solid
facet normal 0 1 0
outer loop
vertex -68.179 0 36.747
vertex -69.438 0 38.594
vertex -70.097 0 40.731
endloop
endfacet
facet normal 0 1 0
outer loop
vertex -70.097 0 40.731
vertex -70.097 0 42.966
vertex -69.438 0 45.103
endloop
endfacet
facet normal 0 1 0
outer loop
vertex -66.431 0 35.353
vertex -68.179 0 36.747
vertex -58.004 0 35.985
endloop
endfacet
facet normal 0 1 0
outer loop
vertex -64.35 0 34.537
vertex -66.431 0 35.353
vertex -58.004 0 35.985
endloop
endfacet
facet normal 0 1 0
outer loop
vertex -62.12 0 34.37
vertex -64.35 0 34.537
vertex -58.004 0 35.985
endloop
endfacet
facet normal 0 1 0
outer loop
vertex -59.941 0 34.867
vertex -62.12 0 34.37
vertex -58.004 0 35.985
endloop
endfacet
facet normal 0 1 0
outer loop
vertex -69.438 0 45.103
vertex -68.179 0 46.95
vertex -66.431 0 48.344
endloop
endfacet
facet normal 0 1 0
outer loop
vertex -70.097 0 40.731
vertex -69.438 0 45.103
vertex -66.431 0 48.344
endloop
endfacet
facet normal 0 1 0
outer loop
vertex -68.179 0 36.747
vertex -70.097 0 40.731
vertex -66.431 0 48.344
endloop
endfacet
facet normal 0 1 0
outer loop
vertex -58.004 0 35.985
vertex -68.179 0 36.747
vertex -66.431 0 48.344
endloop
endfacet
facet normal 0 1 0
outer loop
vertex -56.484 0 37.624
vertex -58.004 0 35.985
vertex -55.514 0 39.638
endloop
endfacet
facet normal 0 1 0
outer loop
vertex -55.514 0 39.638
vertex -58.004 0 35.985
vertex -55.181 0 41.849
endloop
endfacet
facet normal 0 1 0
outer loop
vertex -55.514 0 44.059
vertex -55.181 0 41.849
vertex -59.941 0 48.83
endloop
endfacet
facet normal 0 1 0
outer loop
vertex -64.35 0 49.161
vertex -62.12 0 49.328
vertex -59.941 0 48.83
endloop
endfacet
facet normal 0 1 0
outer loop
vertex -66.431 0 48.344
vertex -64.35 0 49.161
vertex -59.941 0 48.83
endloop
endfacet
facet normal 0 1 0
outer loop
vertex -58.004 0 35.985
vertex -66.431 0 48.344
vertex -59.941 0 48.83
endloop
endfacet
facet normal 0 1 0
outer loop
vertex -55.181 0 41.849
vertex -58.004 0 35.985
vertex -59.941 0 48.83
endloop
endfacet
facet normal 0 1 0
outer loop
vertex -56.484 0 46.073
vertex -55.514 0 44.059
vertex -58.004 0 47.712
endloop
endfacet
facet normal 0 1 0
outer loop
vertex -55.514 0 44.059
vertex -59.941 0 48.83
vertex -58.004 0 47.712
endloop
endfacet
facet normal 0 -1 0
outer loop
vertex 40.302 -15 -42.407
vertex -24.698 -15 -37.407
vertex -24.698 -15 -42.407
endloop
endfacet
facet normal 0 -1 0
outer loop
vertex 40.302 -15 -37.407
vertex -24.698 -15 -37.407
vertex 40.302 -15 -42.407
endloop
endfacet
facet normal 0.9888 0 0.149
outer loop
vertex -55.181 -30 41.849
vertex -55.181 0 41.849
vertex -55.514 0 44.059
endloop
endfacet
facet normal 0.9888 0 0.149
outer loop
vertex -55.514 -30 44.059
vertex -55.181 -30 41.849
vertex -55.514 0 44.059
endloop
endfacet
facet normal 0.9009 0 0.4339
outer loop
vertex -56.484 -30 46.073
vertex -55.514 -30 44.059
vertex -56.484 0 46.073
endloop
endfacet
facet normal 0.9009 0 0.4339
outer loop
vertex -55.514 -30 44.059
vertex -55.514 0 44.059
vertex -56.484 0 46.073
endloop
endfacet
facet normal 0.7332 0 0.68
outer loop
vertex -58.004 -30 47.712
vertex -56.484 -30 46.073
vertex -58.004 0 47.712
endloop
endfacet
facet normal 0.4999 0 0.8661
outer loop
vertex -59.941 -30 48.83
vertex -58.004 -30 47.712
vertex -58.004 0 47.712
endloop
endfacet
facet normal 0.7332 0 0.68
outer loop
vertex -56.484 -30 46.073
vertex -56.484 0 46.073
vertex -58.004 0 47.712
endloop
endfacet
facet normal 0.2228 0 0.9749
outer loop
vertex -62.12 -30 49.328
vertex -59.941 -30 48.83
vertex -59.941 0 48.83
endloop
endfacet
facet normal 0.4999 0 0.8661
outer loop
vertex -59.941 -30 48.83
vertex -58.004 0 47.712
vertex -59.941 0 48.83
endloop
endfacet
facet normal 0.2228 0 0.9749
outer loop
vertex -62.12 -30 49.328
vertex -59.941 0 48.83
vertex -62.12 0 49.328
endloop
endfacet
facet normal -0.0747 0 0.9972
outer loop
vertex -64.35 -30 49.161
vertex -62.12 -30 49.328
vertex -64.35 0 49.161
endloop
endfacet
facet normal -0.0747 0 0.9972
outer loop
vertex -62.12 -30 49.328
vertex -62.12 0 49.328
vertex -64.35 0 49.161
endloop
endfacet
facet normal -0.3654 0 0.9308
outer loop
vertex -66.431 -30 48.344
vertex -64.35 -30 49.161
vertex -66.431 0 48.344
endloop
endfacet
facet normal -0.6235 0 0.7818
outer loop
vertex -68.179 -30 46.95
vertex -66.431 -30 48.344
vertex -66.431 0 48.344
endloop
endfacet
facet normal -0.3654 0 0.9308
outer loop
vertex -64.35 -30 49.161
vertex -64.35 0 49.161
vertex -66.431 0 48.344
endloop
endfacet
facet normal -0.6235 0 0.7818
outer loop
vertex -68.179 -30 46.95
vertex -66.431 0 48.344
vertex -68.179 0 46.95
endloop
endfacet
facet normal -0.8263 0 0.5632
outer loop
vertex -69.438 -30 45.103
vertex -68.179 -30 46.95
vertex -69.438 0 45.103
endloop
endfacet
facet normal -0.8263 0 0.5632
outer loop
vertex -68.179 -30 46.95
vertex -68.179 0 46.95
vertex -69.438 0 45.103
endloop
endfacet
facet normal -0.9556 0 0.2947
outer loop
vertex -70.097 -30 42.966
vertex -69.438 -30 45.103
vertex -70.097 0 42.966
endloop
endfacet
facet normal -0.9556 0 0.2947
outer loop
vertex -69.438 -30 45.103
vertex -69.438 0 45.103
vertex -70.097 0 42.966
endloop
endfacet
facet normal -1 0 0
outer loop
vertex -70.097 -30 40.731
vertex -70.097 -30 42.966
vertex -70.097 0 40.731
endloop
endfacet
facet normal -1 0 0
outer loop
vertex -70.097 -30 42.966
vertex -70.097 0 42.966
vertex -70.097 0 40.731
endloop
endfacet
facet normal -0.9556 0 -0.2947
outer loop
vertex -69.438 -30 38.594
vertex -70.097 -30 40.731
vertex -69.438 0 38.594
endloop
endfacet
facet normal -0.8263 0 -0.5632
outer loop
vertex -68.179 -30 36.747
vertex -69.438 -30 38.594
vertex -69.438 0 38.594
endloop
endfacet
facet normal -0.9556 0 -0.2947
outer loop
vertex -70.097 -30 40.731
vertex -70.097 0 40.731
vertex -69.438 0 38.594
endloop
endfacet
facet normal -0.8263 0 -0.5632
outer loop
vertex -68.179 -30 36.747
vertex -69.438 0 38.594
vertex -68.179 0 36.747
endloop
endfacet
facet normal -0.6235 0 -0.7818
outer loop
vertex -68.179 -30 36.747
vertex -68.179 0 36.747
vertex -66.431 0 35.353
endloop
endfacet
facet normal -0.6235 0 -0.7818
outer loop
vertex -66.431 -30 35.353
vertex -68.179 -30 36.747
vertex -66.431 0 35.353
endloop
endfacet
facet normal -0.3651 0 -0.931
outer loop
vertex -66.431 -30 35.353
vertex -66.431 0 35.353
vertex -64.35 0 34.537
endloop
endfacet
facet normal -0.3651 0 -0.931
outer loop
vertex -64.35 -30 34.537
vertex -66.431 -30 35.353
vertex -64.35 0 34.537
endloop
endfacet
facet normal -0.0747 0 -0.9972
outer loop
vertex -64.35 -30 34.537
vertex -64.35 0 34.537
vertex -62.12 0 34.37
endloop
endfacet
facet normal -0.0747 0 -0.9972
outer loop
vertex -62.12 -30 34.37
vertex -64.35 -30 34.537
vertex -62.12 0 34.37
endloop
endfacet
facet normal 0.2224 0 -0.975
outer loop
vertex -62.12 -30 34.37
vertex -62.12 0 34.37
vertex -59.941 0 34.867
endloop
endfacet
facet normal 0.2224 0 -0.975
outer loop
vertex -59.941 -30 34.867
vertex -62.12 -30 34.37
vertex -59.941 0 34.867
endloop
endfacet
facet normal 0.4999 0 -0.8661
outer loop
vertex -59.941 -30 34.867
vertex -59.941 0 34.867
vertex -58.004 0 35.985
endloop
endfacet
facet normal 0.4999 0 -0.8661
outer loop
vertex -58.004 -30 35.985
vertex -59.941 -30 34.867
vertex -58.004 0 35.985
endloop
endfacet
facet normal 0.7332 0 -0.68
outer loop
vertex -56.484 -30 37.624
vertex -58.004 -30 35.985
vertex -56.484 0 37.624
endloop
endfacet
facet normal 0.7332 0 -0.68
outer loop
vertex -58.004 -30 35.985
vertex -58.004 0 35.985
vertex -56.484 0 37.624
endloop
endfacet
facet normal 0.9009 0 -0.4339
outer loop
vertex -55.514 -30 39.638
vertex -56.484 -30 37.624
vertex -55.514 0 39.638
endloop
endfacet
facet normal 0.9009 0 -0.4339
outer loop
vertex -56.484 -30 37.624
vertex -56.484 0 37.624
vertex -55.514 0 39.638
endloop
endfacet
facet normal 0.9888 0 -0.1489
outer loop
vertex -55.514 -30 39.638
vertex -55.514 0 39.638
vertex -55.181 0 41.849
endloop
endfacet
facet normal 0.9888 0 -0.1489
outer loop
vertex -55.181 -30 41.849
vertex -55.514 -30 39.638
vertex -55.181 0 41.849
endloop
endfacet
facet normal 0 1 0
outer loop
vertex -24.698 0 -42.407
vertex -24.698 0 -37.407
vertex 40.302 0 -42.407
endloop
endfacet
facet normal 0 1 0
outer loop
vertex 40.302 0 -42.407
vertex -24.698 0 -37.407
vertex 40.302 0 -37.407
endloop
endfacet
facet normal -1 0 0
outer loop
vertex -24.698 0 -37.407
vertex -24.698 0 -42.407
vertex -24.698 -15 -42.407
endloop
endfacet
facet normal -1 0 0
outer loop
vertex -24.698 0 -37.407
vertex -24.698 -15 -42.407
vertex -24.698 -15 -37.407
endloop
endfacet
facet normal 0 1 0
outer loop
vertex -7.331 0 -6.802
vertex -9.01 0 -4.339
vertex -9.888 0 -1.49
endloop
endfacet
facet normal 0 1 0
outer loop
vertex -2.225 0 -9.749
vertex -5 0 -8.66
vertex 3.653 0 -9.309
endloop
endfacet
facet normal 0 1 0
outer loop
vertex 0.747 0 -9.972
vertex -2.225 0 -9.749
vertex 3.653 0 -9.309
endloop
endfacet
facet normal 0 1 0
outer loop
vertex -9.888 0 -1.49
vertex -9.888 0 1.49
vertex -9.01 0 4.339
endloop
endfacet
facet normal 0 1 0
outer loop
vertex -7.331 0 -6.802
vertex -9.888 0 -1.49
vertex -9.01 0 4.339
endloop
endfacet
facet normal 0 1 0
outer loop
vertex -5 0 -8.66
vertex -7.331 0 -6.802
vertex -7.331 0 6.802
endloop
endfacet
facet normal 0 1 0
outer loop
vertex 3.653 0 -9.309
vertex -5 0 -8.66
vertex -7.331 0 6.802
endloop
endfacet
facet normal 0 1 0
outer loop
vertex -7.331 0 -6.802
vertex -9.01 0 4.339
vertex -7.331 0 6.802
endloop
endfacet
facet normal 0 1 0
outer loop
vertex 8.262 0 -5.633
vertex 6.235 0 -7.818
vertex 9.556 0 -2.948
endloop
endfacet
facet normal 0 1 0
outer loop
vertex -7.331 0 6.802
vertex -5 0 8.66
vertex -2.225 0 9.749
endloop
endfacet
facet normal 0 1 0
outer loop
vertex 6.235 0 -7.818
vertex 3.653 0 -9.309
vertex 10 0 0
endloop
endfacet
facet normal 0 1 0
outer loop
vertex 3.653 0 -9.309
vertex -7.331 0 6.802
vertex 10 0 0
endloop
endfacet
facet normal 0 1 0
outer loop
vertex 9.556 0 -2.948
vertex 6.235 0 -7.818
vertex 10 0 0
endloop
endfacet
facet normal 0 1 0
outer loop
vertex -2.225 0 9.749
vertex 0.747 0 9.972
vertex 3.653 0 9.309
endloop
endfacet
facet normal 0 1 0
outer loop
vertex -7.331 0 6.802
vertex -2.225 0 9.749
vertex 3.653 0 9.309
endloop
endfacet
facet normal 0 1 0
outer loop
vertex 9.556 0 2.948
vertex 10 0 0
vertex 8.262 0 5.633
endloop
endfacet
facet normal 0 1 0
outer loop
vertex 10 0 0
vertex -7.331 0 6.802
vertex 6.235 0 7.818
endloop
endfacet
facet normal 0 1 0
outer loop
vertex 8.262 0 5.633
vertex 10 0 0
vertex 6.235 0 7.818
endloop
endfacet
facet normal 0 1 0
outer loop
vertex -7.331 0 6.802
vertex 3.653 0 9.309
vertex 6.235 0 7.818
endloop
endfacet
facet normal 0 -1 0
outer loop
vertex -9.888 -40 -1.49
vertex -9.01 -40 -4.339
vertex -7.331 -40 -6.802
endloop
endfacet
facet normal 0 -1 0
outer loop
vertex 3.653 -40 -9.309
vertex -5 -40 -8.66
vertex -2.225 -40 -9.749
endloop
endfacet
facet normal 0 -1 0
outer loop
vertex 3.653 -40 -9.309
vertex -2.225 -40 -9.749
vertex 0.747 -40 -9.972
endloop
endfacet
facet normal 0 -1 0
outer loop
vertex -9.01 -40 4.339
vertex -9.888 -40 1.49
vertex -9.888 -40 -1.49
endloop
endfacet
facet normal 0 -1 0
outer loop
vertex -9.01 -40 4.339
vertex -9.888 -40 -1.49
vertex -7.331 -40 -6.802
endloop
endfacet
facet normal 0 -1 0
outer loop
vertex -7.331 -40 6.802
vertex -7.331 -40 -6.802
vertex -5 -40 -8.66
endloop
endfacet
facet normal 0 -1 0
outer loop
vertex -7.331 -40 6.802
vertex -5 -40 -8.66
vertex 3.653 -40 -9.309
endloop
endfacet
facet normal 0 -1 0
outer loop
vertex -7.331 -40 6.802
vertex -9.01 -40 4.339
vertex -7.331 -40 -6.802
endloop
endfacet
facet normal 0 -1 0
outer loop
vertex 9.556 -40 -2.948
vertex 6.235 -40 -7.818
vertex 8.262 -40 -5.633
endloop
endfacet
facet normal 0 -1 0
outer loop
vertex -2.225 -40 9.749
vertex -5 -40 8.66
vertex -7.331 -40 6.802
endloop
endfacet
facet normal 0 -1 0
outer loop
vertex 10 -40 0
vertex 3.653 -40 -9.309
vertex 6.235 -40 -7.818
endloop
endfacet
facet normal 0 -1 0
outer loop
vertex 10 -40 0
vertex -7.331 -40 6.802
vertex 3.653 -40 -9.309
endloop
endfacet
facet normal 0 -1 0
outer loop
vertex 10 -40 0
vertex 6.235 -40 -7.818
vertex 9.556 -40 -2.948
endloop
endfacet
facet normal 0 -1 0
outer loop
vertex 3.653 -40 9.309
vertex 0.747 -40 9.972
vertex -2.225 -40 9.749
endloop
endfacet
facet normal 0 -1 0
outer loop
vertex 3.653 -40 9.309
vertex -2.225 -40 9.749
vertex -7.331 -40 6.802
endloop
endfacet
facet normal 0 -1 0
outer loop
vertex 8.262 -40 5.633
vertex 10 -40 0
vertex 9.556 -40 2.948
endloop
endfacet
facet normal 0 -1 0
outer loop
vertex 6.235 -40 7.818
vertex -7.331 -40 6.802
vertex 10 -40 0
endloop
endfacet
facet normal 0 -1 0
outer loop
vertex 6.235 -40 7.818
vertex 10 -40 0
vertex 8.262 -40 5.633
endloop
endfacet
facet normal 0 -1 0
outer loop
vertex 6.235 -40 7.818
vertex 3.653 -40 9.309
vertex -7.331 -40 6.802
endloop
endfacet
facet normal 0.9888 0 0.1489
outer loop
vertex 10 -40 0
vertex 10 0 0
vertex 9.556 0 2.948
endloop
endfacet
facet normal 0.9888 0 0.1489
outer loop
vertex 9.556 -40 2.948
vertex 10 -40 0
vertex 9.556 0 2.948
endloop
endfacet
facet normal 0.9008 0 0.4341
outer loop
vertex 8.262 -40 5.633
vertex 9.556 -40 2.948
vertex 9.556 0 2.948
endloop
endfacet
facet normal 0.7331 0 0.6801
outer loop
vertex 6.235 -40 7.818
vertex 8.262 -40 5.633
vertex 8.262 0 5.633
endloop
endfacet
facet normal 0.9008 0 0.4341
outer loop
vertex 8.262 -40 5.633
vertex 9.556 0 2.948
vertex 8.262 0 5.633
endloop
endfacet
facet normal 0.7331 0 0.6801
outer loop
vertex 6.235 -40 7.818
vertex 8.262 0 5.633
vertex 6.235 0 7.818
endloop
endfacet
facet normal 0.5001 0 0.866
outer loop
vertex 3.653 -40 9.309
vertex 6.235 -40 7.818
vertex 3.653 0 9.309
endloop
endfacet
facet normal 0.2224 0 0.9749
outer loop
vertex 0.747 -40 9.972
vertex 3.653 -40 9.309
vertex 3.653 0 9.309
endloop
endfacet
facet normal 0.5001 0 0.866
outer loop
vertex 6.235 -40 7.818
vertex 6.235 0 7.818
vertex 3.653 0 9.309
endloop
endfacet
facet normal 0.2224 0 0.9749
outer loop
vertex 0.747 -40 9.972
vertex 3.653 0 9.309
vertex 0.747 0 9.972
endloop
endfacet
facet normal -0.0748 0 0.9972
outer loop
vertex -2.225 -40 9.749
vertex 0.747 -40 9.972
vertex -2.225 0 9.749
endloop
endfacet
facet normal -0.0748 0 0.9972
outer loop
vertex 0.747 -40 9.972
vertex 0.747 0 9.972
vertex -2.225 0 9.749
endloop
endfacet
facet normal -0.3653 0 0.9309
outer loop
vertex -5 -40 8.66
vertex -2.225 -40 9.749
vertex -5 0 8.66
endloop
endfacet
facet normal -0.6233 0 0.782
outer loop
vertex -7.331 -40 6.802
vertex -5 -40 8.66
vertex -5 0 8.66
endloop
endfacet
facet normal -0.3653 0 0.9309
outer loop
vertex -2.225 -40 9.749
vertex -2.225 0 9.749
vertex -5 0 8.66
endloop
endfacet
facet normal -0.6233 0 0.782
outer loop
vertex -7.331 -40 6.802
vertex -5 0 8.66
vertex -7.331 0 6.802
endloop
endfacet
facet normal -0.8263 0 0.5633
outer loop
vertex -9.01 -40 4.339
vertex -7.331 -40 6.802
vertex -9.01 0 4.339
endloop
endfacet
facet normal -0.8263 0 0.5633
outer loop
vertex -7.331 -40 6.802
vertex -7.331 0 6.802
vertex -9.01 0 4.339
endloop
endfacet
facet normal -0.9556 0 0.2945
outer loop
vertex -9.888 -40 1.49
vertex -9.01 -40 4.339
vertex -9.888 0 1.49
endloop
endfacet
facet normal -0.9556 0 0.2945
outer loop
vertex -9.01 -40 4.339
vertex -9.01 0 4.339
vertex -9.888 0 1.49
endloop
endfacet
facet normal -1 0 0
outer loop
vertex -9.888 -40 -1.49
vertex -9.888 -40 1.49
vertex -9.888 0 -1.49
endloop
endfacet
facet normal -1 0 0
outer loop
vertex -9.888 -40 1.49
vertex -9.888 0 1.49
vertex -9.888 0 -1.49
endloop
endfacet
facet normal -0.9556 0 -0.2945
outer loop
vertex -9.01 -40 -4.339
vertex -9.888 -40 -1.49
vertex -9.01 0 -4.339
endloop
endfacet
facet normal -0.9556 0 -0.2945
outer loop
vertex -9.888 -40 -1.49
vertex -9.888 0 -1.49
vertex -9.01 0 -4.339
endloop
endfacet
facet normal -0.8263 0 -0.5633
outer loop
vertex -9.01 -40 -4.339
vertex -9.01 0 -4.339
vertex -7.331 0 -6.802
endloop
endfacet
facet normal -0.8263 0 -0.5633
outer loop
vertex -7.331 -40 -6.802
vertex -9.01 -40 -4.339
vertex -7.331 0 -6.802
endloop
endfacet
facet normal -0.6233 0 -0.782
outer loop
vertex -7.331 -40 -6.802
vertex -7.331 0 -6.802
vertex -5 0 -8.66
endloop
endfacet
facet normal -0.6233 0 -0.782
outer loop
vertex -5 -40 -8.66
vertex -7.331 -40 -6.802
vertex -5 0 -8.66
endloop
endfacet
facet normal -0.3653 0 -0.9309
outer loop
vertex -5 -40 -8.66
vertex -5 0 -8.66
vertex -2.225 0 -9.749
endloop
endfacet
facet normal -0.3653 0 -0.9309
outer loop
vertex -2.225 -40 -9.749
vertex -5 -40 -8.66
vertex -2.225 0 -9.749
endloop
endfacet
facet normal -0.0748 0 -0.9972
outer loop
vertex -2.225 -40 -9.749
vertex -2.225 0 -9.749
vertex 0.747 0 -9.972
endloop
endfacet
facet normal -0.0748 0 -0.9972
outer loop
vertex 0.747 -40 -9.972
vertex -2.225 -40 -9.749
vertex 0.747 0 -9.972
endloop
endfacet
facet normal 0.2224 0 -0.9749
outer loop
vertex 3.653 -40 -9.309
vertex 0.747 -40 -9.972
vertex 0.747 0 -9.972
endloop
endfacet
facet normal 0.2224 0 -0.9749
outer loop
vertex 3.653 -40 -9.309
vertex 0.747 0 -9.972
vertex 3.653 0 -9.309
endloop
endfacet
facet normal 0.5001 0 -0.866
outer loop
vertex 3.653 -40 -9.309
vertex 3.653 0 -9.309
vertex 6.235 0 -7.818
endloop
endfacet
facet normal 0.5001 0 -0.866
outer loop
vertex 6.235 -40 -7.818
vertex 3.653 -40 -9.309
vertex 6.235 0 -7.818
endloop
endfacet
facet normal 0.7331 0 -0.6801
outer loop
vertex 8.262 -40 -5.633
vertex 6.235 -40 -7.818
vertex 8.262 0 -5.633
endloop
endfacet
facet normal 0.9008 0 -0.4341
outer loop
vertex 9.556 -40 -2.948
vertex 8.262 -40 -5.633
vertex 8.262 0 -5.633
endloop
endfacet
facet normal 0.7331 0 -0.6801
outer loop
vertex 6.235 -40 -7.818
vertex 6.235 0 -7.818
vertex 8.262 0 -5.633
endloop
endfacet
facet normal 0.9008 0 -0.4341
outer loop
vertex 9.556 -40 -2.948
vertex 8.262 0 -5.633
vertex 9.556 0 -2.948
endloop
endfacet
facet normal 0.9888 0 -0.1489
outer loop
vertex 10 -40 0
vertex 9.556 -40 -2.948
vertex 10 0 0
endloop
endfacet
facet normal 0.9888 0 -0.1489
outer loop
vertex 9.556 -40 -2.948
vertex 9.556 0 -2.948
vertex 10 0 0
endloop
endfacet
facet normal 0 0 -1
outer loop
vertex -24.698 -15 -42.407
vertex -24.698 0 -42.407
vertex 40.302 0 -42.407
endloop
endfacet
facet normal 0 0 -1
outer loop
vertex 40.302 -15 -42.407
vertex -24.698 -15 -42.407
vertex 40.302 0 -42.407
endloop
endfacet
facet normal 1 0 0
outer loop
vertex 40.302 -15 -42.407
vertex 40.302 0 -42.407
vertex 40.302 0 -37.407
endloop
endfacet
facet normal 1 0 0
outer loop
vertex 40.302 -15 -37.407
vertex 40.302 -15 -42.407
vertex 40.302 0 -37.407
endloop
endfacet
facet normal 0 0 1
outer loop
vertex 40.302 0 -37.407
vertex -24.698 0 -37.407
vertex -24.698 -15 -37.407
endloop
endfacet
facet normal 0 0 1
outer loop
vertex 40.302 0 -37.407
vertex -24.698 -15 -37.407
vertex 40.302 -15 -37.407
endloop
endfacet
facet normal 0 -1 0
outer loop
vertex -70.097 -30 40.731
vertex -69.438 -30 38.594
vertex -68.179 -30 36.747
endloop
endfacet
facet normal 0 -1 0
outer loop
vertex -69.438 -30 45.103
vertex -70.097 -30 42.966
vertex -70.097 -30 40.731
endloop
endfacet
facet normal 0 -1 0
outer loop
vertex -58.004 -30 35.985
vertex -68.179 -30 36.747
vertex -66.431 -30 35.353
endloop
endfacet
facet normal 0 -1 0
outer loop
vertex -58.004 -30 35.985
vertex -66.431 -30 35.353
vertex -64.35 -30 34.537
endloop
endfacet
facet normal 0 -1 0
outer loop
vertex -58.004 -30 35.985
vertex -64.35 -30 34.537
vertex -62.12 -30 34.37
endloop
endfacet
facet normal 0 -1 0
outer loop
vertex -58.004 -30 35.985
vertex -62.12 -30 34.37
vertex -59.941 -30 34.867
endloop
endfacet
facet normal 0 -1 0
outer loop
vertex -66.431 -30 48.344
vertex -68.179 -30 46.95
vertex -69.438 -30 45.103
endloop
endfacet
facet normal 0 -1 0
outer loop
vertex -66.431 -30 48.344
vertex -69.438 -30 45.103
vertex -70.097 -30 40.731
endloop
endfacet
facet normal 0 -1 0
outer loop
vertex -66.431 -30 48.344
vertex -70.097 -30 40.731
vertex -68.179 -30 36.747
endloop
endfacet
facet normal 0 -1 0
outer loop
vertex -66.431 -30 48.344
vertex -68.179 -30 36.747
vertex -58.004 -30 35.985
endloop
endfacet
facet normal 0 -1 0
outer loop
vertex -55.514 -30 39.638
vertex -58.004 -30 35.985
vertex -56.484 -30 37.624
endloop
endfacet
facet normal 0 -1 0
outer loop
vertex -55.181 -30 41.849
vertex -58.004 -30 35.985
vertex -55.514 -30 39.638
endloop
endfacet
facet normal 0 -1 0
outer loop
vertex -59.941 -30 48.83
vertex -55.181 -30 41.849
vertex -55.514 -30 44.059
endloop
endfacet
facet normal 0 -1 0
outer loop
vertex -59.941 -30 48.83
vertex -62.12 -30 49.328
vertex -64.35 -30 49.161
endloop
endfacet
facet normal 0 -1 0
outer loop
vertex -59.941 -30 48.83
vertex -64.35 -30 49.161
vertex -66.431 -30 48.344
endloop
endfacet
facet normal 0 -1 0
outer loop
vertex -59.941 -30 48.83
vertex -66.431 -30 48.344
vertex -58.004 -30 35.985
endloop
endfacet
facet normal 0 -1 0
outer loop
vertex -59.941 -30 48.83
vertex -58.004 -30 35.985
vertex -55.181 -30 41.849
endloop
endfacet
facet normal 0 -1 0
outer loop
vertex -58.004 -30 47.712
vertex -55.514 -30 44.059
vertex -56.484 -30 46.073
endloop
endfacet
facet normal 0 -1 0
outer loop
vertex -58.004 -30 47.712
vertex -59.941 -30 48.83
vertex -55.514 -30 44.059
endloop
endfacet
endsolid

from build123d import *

# Parameters (mm, degrees)
F0_R     = 7.5
F1_DEPTH = 30
F2_R     = 10
F3_DEPTH = 40
F4_W     = 65
F4_H     = 5
F5_DEPTH = 15


with BuildPart() as f1:
    # F0 (on Front) → F1 (new body)
    with BuildSketch(Plane.XZ):
        with Locations((-62.680647, 41.848551)):
            Circle(F0_R)
    extrude(amount=F1_DEPTH)


with BuildPart() as f3:
    # F2 (on Front) → F3 (new body)
    with BuildSketch(Plane.XZ):
        Circle(F2_R)
    extrude(amount=F3_DEPTH)


with BuildPart() as f5:
    # F4 (on Front) → F5 (new body)
    with BuildSketch(Plane.XZ):
        with Locations((7.802421, -39.907049)):
            Rectangle(F4_W, F4_H)
    extrude(amount=F5_DEPTH)


solid = Compound([f1.part, f3.part, f5.part])
